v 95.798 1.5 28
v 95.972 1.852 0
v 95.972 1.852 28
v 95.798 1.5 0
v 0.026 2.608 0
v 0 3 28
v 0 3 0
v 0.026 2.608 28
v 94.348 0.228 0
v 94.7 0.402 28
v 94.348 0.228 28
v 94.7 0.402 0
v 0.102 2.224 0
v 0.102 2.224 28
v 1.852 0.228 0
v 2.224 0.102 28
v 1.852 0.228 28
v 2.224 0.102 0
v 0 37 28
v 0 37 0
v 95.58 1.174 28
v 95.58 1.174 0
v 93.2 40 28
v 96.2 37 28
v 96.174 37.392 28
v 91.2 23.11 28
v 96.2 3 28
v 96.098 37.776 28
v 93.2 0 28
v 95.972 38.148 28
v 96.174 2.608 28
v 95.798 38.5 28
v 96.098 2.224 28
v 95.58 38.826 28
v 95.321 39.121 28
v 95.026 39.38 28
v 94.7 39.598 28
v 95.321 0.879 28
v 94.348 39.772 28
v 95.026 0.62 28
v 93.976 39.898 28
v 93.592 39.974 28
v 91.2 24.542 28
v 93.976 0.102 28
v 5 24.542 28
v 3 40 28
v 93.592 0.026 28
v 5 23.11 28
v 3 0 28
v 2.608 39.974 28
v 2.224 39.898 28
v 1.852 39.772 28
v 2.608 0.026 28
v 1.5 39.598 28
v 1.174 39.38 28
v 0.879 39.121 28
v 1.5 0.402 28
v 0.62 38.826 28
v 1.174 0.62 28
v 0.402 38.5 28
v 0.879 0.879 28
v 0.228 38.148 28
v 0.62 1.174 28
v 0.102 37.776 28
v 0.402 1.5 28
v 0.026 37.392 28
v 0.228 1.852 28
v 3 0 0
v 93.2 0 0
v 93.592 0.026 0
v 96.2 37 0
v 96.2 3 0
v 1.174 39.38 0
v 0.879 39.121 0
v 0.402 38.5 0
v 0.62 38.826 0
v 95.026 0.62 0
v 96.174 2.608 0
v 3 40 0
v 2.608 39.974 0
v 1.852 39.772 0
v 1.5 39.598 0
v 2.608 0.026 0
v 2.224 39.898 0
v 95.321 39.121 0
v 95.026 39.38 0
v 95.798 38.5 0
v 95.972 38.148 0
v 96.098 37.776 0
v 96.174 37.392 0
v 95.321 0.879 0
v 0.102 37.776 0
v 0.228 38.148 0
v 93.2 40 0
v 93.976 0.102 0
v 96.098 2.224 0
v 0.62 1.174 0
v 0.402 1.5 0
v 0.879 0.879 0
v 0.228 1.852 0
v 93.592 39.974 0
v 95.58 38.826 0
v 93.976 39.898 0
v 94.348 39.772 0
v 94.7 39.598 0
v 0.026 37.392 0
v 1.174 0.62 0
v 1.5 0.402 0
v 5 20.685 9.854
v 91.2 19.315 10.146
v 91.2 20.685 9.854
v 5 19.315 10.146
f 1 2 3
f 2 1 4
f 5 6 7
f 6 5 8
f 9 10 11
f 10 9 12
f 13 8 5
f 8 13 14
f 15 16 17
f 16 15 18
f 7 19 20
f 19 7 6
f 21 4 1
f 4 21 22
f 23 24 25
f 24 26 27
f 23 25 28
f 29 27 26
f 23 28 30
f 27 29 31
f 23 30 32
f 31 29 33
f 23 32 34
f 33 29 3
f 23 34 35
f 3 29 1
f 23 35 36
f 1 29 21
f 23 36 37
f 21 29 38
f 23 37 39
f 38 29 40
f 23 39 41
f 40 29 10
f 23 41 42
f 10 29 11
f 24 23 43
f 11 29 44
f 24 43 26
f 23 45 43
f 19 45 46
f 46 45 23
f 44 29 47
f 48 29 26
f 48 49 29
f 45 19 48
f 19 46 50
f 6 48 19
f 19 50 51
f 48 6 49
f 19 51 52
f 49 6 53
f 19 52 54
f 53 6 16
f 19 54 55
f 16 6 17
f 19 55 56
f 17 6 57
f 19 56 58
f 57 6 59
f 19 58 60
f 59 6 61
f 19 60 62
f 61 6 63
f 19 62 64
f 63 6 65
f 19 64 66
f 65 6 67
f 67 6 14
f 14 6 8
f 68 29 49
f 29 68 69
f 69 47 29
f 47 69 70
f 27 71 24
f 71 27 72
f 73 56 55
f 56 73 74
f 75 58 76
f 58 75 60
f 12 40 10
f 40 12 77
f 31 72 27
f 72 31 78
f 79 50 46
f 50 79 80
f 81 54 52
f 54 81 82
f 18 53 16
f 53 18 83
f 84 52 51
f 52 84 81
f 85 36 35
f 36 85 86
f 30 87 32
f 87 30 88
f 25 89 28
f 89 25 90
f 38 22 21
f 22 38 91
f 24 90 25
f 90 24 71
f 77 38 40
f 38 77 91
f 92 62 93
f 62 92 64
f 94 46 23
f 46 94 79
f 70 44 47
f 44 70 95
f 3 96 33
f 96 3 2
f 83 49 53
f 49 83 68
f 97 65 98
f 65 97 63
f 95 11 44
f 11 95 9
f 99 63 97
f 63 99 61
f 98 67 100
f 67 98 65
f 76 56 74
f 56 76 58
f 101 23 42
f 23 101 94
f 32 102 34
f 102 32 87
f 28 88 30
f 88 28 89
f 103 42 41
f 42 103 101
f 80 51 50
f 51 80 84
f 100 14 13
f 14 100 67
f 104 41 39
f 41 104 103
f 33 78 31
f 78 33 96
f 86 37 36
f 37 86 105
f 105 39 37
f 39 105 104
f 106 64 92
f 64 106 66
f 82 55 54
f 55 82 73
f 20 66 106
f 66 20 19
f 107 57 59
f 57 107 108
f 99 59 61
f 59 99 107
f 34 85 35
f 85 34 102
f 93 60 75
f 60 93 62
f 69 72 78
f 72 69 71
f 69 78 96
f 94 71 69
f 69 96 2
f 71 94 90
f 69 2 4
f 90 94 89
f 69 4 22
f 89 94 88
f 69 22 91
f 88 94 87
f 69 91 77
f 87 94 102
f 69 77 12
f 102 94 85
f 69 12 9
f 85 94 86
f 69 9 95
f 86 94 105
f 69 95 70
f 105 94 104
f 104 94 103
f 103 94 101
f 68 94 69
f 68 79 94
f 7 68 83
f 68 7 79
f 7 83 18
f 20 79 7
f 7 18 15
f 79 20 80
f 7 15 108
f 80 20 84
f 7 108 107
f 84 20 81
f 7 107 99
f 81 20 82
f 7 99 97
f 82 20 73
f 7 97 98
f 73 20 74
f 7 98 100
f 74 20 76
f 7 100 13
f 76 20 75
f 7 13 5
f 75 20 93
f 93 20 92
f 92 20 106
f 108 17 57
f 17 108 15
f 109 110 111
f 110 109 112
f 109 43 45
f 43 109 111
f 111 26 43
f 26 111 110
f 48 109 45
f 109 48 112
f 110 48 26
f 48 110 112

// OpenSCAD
// Parametric desktop stand for a standard card (CR80, 85.6 x 54 mm).
// Units: millimeters. Open in OpenSCAD (free): F5 preview, F6 render, then export STL.

$fn = 48;

card_width      = 85.6;   // CR80 width
card_thickness  = 0.8;    // typical card; thicker for metal cards
clearance       = 0.6;    // extra room so the card slides in
wall            = 5;      // material left on each side of the slot
floor_thickness = 4;      // material left under the slot (keep >= 3 for strength)
stand_depth     = 40;
stand_height    = 28;
slot_depth      = 18;     // how far the slot cuts down from the top
tilt            = 12;     // lean-back angle in degrees
corner_r        = 3;

slot_w = card_width + clearance;
slot_t = card_thickness + clearance;
stand_w = slot_w + 2 * wall;

assert(slot_depth <= stand_height - floor_thickness, "slot too deep: floor would be too thin");
assert(stand_w > slot_w, "stand must be wider than the slot");

module rounded_block(w, d, h, r) {
    hull() for (x = [r, w - r], y = [r, d - r]) translate([x, y, 0]) cylinder(r = r, h = h);
}

module card_slot() {
    translate([stand_w / 2, stand_depth / 2, stand_height - slot_depth])
    rotate([-tilt, 0, 0])
    translate([-slot_w / 2, -slot_t / 2, 0])
    cube([slot_w, slot_t, slot_depth * 2]);
}

difference() {
    rounded_block(stand_w, stand_depth, stand_height, corner_r);
    card_slot();
}
